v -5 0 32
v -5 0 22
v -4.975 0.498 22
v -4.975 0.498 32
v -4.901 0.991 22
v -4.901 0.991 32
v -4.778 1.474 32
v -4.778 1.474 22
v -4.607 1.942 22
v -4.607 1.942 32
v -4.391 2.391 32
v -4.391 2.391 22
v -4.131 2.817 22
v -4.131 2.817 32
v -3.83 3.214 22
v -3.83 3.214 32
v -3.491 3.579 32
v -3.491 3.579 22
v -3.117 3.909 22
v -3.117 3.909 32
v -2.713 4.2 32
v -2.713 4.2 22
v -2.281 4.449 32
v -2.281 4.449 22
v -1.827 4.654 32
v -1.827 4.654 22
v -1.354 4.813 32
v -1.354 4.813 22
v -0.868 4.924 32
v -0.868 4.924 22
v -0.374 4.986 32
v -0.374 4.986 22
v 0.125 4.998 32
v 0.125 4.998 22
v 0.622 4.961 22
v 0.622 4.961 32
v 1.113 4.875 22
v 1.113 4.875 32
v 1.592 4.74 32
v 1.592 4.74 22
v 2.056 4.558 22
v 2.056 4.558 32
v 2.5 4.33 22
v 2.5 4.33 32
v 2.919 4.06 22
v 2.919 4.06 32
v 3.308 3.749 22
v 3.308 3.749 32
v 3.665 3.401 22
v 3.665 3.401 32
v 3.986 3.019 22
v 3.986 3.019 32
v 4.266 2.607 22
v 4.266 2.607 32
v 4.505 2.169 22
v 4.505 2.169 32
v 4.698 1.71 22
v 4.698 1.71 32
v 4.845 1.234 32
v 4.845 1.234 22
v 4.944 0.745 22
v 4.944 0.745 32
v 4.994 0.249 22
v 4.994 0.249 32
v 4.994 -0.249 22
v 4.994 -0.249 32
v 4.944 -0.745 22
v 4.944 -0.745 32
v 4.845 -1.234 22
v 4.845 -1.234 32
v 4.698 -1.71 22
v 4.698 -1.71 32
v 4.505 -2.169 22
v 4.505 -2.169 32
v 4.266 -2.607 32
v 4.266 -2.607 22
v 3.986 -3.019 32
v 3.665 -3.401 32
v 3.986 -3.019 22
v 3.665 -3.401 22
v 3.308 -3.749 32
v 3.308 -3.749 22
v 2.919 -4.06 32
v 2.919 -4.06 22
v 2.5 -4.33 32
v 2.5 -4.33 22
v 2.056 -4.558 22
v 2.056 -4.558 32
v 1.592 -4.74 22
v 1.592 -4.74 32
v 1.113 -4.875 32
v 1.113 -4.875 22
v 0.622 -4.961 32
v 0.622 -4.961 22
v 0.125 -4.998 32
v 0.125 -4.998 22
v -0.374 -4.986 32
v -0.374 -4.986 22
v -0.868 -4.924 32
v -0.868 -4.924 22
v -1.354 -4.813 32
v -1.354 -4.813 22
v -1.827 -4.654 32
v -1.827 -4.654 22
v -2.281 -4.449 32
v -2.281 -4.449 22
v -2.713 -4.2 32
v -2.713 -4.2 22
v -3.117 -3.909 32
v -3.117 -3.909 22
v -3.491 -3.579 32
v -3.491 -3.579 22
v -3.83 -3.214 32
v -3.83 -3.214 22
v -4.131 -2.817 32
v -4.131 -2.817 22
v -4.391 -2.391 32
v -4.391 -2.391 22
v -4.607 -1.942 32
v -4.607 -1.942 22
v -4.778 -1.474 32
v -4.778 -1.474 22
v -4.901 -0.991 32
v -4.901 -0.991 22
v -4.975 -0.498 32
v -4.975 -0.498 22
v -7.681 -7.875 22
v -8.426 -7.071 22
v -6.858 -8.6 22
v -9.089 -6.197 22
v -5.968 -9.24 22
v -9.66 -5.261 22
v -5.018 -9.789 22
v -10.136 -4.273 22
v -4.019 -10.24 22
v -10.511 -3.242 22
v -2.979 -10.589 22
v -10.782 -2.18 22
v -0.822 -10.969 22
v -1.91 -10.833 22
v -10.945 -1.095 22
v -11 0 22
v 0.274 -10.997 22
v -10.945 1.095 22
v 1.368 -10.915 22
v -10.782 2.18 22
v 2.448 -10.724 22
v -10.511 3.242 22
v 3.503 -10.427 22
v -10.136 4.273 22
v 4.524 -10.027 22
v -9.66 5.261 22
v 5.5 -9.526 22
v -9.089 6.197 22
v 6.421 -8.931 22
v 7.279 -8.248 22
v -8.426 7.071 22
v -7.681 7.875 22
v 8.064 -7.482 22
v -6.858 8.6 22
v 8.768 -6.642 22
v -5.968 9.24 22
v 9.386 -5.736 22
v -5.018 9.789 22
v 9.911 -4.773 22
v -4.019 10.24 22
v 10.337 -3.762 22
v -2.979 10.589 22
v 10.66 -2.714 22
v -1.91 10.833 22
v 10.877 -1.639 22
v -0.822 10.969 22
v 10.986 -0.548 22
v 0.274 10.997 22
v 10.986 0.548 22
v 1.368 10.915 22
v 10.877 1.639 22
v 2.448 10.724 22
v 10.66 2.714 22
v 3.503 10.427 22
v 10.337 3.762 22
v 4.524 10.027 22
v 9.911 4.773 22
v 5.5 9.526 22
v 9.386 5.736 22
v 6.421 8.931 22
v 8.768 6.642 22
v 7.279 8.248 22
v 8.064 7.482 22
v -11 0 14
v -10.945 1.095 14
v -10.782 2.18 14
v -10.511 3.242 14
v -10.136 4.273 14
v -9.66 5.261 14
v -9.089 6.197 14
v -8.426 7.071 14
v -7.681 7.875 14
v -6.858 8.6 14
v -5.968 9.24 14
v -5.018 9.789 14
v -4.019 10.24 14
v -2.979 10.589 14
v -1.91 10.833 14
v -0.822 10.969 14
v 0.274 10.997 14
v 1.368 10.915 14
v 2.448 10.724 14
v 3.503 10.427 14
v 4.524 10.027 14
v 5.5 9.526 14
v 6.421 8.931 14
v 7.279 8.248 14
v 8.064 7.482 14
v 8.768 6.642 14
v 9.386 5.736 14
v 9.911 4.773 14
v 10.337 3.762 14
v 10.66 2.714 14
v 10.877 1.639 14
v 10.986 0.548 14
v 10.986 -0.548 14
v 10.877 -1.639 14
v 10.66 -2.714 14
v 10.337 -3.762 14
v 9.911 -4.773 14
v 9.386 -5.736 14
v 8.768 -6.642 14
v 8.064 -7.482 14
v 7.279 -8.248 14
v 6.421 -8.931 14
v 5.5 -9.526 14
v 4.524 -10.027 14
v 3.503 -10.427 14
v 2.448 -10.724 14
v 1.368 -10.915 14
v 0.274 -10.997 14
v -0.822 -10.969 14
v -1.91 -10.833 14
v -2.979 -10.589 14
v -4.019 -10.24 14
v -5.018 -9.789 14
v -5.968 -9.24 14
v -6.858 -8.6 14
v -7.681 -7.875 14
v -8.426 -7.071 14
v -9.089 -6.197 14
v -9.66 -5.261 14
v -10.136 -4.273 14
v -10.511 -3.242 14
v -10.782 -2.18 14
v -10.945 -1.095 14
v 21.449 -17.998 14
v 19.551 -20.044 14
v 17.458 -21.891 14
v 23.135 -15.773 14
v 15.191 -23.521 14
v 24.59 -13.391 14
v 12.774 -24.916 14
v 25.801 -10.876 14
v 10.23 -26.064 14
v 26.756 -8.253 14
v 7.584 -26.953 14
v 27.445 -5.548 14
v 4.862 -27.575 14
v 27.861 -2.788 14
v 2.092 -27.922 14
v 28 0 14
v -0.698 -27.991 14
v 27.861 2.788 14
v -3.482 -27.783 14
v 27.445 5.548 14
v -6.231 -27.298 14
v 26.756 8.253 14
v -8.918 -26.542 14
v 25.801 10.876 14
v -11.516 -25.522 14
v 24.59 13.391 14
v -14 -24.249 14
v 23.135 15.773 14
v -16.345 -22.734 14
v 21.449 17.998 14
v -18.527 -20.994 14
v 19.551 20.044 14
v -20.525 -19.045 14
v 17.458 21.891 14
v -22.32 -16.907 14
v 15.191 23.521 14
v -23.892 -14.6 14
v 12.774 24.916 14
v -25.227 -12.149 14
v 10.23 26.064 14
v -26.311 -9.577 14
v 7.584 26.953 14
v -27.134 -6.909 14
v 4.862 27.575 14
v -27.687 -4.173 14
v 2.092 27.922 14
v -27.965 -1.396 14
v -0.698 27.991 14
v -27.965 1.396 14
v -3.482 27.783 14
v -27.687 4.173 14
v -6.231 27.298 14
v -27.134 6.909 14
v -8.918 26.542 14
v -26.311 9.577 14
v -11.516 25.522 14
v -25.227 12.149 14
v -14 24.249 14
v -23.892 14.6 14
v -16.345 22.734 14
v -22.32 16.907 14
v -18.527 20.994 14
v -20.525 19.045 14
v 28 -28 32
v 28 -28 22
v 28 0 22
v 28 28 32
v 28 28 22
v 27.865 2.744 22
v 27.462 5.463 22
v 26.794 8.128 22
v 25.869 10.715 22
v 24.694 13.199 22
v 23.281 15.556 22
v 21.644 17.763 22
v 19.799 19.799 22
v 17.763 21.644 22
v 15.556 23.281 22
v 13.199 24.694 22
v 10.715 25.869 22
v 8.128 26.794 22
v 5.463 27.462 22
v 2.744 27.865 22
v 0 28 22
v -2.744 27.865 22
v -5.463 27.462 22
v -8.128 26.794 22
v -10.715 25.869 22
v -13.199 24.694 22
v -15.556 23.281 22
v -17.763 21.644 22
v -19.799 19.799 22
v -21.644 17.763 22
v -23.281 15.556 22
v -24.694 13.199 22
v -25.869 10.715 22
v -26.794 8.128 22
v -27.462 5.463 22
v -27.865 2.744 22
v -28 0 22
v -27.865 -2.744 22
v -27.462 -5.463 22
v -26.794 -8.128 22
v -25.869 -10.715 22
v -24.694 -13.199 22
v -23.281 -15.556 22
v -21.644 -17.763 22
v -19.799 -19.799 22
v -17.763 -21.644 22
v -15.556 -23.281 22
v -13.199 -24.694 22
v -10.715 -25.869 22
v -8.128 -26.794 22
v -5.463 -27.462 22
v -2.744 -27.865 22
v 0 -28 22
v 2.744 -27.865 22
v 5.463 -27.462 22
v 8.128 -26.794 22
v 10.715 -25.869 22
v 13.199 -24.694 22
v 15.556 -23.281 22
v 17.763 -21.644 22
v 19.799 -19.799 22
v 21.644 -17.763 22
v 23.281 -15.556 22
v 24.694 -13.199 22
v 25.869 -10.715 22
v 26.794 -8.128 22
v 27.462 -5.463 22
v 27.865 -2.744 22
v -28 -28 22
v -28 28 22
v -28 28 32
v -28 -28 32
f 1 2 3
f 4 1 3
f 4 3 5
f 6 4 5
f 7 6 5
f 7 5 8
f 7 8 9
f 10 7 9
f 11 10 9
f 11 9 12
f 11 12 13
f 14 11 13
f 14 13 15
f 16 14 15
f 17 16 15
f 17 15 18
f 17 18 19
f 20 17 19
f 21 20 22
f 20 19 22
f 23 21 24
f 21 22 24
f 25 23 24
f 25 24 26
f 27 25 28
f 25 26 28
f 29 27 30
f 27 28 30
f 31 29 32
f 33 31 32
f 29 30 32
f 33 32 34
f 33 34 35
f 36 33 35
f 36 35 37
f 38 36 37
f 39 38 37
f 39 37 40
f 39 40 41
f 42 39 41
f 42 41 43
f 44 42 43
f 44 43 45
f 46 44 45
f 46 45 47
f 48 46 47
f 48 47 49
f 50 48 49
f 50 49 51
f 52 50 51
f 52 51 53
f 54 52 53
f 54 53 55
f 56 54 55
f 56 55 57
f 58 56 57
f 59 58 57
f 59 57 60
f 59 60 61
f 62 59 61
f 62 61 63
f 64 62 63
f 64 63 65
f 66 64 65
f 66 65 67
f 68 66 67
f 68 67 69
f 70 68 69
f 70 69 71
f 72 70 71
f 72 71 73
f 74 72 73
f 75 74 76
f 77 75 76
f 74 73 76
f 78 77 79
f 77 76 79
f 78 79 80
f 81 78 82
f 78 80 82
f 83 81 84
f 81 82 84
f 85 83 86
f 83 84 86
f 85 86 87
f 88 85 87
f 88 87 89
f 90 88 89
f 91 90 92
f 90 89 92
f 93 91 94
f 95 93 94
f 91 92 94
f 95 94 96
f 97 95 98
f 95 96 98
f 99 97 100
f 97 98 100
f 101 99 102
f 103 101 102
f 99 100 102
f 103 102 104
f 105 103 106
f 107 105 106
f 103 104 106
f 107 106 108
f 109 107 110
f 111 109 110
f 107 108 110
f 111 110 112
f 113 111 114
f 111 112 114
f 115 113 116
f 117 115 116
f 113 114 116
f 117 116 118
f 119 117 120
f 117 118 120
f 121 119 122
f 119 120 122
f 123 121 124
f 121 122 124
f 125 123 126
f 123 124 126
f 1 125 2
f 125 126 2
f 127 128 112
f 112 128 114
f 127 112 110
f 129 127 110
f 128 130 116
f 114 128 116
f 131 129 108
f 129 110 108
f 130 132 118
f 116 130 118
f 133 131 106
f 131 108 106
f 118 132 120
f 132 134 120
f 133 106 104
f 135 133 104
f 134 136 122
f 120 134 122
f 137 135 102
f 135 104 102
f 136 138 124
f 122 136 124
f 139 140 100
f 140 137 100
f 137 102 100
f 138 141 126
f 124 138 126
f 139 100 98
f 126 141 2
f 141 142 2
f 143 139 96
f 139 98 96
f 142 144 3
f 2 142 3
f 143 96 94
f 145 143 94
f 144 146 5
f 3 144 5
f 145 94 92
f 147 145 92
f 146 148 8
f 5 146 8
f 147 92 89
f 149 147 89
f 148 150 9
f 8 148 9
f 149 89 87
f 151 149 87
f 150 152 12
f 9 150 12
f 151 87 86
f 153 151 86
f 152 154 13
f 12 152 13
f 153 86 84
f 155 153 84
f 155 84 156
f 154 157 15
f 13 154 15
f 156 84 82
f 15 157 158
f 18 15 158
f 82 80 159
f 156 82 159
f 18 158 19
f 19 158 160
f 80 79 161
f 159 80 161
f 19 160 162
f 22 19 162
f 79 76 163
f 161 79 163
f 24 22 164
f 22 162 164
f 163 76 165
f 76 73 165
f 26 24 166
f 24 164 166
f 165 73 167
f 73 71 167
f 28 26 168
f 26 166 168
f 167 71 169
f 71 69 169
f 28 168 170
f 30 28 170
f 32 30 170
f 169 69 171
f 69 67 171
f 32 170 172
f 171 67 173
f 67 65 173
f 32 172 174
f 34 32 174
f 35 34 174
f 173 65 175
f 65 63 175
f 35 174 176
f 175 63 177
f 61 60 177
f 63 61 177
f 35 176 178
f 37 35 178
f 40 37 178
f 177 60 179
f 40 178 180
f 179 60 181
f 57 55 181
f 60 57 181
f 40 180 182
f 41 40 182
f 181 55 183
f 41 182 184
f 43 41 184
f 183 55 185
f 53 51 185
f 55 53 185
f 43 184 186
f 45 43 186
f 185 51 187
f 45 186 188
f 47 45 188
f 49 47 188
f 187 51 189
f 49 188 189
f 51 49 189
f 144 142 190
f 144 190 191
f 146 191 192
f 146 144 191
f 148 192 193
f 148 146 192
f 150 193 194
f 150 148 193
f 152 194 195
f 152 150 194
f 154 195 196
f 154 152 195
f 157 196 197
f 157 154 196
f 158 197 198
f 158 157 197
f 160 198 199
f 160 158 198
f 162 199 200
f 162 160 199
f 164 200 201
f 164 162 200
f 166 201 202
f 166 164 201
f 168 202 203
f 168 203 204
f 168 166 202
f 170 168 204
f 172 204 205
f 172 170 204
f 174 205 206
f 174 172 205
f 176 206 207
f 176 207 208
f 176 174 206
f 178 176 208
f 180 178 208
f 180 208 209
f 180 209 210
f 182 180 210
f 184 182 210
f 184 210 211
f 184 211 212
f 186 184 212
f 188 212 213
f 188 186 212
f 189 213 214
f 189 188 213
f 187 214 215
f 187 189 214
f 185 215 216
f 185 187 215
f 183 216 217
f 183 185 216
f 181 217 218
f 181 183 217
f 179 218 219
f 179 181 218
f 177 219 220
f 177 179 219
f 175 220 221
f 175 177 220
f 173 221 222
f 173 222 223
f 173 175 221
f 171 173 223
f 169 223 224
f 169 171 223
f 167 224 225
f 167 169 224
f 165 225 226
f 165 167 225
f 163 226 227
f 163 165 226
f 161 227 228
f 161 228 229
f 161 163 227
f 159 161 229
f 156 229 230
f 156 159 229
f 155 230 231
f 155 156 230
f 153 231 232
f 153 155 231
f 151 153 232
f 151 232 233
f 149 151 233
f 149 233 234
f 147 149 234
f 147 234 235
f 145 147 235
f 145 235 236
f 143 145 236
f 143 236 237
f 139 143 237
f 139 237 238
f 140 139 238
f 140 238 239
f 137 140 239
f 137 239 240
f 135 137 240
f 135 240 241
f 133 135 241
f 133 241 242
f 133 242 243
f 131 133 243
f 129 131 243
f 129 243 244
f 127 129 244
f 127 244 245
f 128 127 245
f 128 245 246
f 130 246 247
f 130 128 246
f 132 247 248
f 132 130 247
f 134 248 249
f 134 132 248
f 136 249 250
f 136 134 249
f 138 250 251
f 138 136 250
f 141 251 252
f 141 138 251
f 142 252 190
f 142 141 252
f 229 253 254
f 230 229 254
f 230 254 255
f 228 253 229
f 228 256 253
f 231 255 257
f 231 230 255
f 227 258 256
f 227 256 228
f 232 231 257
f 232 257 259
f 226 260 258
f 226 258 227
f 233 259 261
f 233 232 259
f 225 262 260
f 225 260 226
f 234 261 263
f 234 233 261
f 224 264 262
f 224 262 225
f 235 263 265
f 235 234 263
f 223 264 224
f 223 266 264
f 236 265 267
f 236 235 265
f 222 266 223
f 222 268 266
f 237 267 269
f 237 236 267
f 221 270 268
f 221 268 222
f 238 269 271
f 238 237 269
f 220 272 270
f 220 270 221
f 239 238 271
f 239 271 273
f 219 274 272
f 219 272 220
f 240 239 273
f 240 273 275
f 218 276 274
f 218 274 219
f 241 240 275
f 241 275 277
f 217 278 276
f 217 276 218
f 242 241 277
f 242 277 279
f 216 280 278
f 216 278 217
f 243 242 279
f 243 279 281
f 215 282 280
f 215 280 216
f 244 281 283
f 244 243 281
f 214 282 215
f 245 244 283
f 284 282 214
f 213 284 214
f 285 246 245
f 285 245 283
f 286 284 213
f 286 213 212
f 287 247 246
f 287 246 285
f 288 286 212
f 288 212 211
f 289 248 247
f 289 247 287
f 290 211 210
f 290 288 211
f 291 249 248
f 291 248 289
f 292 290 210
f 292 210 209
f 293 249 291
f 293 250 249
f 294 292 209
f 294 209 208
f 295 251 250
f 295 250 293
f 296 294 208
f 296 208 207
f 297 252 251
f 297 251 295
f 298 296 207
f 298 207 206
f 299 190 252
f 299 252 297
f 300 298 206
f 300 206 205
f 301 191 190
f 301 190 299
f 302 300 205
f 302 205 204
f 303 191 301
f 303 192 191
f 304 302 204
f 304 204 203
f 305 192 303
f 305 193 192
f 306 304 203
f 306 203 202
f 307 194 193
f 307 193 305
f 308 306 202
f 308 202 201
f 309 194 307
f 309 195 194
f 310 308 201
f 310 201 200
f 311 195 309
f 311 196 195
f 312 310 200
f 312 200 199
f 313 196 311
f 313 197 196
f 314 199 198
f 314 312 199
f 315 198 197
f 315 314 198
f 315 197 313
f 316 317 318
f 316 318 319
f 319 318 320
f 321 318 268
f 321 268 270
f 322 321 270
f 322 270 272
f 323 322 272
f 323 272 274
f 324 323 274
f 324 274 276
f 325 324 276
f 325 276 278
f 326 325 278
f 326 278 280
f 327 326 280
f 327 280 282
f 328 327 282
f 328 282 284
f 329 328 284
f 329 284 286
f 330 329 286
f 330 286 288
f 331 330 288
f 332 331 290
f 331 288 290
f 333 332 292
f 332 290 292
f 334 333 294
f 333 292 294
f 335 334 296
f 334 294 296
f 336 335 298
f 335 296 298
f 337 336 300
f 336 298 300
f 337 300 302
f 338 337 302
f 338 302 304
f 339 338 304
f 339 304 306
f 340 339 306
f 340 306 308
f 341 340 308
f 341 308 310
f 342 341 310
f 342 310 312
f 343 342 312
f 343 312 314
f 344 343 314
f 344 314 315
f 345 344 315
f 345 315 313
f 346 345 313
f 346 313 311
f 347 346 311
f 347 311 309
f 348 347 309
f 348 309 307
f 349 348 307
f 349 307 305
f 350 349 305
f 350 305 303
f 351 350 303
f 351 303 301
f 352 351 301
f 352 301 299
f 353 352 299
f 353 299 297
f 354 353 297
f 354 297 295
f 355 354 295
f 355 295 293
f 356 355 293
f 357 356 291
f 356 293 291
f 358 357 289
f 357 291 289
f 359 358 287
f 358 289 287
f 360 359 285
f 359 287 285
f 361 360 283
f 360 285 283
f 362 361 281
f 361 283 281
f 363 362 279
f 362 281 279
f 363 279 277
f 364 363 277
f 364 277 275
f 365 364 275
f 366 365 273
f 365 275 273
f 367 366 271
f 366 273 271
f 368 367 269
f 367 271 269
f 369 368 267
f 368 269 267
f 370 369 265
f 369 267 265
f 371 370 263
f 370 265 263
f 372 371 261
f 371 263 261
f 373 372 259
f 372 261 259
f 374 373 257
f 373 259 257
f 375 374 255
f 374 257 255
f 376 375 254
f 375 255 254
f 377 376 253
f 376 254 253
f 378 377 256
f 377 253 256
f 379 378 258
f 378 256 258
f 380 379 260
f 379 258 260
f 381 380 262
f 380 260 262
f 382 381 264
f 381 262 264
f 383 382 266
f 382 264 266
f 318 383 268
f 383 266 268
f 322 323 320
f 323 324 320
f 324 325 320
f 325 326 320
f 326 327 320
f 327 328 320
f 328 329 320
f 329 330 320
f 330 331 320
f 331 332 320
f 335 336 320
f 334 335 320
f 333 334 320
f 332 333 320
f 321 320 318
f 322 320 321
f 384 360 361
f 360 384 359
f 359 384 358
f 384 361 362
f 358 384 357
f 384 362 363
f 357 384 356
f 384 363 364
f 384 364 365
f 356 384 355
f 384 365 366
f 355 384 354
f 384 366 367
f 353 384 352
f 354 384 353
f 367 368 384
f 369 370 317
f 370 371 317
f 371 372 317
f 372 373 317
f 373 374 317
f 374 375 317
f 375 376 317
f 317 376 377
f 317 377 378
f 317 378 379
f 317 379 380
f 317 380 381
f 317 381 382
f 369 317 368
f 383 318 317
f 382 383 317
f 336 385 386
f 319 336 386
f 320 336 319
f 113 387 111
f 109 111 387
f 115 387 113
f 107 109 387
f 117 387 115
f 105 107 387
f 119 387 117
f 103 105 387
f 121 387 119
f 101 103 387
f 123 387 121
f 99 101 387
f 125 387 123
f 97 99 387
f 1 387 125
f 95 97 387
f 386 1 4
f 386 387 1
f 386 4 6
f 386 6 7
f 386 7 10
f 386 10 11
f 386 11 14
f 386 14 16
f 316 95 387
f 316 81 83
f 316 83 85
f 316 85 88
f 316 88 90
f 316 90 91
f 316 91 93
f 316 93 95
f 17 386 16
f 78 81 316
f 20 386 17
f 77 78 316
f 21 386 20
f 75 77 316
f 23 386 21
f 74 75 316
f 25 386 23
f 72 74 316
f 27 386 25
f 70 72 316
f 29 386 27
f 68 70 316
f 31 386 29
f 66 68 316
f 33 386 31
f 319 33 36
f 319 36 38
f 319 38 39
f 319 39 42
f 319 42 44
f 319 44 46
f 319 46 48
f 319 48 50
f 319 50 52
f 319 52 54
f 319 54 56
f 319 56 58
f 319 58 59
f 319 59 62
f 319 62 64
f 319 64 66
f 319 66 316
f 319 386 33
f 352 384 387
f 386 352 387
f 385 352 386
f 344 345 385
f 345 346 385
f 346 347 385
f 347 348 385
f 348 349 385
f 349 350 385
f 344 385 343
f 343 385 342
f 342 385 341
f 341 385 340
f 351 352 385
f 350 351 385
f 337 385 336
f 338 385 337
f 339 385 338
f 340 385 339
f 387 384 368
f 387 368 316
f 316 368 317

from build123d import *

# Parameters (mm, degrees)
SKETCH1_R           = 28
SKETCH1_R_2         = 18
BOSS_EXTRUDE1_DEPTH = 22
SKETCH2_W           = 56
SKETCH2_H           = 56
BOSS_EXTRUDE2_DEPTH = 10
SKETCH3_W           = 56
SKETCH3_H           = 60.095758966
CUT_EXTRUDE1_DEPTH  = 14
SKETCH4_R           = 5
CUT_EXTRUDE2_DEPTH  = 14
SKETCH5_R           = 21.225012464
SKETCH5_R_2         = 11
BOSS_EXTRUDE3_DEPTH = 8


with BuildPart() as part:
    # Sketch1 → Boss-Extrude1 (new body)
    with BuildSketch(Plane.XY):
        Circle(SKETCH1_R)
        Circle(SKETCH1_R_2, mode=Mode.SUBTRACT)
    extrude(amount=BOSS_EXTRUDE1_DEPTH)

    # Sketch2 → Boss-Extrude2 (add)
    with BuildSketch(Plane.XY.offset(22)):
        Rectangle(SKETCH2_W, SKETCH2_H)
    extrude(amount=BOSS_EXTRUDE2_DEPTH)

    # Sketch3 → Cut-Extrude1 (cut)
    with BuildSketch(Plane(origin=(0, 0, 0), x_dir=(-1, 0, 0), z_dir=(0, 0, -1))):
        with Locations((0, 2.047879483)):
            Rectangle(SKETCH3_W, SKETCH3_H)
    extrude(amount=-CUT_EXTRUDE1_DEPTH, mode=Mode.SUBTRACT)

    # Sketch4 → Cut-Extrude2 (cut)
    with BuildSketch(Plane(origin=(0, 0, 22), x_dir=(-1, 0, 0), z_dir=(0, 0, -1))):
        Circle(SKETCH4_R)
    extrude(amount=-CUT_EXTRUDE2_DEPTH, mode=Mode.SUBTRACT)

    # Sketch5 → Boss-Extrude3 (add)
    with BuildSketch(Plane(origin=(0, 0, 22), x_dir=(-1, 0, 0), z_dir=(0, 0, -1))):
        Circle(SKETCH5_R)
        Circle(SKETCH5_R_2, mode=Mode.SUBTRACT)
    extrude(amount=BOSS_EXTRUDE3_DEPTH)


solid = part.part
